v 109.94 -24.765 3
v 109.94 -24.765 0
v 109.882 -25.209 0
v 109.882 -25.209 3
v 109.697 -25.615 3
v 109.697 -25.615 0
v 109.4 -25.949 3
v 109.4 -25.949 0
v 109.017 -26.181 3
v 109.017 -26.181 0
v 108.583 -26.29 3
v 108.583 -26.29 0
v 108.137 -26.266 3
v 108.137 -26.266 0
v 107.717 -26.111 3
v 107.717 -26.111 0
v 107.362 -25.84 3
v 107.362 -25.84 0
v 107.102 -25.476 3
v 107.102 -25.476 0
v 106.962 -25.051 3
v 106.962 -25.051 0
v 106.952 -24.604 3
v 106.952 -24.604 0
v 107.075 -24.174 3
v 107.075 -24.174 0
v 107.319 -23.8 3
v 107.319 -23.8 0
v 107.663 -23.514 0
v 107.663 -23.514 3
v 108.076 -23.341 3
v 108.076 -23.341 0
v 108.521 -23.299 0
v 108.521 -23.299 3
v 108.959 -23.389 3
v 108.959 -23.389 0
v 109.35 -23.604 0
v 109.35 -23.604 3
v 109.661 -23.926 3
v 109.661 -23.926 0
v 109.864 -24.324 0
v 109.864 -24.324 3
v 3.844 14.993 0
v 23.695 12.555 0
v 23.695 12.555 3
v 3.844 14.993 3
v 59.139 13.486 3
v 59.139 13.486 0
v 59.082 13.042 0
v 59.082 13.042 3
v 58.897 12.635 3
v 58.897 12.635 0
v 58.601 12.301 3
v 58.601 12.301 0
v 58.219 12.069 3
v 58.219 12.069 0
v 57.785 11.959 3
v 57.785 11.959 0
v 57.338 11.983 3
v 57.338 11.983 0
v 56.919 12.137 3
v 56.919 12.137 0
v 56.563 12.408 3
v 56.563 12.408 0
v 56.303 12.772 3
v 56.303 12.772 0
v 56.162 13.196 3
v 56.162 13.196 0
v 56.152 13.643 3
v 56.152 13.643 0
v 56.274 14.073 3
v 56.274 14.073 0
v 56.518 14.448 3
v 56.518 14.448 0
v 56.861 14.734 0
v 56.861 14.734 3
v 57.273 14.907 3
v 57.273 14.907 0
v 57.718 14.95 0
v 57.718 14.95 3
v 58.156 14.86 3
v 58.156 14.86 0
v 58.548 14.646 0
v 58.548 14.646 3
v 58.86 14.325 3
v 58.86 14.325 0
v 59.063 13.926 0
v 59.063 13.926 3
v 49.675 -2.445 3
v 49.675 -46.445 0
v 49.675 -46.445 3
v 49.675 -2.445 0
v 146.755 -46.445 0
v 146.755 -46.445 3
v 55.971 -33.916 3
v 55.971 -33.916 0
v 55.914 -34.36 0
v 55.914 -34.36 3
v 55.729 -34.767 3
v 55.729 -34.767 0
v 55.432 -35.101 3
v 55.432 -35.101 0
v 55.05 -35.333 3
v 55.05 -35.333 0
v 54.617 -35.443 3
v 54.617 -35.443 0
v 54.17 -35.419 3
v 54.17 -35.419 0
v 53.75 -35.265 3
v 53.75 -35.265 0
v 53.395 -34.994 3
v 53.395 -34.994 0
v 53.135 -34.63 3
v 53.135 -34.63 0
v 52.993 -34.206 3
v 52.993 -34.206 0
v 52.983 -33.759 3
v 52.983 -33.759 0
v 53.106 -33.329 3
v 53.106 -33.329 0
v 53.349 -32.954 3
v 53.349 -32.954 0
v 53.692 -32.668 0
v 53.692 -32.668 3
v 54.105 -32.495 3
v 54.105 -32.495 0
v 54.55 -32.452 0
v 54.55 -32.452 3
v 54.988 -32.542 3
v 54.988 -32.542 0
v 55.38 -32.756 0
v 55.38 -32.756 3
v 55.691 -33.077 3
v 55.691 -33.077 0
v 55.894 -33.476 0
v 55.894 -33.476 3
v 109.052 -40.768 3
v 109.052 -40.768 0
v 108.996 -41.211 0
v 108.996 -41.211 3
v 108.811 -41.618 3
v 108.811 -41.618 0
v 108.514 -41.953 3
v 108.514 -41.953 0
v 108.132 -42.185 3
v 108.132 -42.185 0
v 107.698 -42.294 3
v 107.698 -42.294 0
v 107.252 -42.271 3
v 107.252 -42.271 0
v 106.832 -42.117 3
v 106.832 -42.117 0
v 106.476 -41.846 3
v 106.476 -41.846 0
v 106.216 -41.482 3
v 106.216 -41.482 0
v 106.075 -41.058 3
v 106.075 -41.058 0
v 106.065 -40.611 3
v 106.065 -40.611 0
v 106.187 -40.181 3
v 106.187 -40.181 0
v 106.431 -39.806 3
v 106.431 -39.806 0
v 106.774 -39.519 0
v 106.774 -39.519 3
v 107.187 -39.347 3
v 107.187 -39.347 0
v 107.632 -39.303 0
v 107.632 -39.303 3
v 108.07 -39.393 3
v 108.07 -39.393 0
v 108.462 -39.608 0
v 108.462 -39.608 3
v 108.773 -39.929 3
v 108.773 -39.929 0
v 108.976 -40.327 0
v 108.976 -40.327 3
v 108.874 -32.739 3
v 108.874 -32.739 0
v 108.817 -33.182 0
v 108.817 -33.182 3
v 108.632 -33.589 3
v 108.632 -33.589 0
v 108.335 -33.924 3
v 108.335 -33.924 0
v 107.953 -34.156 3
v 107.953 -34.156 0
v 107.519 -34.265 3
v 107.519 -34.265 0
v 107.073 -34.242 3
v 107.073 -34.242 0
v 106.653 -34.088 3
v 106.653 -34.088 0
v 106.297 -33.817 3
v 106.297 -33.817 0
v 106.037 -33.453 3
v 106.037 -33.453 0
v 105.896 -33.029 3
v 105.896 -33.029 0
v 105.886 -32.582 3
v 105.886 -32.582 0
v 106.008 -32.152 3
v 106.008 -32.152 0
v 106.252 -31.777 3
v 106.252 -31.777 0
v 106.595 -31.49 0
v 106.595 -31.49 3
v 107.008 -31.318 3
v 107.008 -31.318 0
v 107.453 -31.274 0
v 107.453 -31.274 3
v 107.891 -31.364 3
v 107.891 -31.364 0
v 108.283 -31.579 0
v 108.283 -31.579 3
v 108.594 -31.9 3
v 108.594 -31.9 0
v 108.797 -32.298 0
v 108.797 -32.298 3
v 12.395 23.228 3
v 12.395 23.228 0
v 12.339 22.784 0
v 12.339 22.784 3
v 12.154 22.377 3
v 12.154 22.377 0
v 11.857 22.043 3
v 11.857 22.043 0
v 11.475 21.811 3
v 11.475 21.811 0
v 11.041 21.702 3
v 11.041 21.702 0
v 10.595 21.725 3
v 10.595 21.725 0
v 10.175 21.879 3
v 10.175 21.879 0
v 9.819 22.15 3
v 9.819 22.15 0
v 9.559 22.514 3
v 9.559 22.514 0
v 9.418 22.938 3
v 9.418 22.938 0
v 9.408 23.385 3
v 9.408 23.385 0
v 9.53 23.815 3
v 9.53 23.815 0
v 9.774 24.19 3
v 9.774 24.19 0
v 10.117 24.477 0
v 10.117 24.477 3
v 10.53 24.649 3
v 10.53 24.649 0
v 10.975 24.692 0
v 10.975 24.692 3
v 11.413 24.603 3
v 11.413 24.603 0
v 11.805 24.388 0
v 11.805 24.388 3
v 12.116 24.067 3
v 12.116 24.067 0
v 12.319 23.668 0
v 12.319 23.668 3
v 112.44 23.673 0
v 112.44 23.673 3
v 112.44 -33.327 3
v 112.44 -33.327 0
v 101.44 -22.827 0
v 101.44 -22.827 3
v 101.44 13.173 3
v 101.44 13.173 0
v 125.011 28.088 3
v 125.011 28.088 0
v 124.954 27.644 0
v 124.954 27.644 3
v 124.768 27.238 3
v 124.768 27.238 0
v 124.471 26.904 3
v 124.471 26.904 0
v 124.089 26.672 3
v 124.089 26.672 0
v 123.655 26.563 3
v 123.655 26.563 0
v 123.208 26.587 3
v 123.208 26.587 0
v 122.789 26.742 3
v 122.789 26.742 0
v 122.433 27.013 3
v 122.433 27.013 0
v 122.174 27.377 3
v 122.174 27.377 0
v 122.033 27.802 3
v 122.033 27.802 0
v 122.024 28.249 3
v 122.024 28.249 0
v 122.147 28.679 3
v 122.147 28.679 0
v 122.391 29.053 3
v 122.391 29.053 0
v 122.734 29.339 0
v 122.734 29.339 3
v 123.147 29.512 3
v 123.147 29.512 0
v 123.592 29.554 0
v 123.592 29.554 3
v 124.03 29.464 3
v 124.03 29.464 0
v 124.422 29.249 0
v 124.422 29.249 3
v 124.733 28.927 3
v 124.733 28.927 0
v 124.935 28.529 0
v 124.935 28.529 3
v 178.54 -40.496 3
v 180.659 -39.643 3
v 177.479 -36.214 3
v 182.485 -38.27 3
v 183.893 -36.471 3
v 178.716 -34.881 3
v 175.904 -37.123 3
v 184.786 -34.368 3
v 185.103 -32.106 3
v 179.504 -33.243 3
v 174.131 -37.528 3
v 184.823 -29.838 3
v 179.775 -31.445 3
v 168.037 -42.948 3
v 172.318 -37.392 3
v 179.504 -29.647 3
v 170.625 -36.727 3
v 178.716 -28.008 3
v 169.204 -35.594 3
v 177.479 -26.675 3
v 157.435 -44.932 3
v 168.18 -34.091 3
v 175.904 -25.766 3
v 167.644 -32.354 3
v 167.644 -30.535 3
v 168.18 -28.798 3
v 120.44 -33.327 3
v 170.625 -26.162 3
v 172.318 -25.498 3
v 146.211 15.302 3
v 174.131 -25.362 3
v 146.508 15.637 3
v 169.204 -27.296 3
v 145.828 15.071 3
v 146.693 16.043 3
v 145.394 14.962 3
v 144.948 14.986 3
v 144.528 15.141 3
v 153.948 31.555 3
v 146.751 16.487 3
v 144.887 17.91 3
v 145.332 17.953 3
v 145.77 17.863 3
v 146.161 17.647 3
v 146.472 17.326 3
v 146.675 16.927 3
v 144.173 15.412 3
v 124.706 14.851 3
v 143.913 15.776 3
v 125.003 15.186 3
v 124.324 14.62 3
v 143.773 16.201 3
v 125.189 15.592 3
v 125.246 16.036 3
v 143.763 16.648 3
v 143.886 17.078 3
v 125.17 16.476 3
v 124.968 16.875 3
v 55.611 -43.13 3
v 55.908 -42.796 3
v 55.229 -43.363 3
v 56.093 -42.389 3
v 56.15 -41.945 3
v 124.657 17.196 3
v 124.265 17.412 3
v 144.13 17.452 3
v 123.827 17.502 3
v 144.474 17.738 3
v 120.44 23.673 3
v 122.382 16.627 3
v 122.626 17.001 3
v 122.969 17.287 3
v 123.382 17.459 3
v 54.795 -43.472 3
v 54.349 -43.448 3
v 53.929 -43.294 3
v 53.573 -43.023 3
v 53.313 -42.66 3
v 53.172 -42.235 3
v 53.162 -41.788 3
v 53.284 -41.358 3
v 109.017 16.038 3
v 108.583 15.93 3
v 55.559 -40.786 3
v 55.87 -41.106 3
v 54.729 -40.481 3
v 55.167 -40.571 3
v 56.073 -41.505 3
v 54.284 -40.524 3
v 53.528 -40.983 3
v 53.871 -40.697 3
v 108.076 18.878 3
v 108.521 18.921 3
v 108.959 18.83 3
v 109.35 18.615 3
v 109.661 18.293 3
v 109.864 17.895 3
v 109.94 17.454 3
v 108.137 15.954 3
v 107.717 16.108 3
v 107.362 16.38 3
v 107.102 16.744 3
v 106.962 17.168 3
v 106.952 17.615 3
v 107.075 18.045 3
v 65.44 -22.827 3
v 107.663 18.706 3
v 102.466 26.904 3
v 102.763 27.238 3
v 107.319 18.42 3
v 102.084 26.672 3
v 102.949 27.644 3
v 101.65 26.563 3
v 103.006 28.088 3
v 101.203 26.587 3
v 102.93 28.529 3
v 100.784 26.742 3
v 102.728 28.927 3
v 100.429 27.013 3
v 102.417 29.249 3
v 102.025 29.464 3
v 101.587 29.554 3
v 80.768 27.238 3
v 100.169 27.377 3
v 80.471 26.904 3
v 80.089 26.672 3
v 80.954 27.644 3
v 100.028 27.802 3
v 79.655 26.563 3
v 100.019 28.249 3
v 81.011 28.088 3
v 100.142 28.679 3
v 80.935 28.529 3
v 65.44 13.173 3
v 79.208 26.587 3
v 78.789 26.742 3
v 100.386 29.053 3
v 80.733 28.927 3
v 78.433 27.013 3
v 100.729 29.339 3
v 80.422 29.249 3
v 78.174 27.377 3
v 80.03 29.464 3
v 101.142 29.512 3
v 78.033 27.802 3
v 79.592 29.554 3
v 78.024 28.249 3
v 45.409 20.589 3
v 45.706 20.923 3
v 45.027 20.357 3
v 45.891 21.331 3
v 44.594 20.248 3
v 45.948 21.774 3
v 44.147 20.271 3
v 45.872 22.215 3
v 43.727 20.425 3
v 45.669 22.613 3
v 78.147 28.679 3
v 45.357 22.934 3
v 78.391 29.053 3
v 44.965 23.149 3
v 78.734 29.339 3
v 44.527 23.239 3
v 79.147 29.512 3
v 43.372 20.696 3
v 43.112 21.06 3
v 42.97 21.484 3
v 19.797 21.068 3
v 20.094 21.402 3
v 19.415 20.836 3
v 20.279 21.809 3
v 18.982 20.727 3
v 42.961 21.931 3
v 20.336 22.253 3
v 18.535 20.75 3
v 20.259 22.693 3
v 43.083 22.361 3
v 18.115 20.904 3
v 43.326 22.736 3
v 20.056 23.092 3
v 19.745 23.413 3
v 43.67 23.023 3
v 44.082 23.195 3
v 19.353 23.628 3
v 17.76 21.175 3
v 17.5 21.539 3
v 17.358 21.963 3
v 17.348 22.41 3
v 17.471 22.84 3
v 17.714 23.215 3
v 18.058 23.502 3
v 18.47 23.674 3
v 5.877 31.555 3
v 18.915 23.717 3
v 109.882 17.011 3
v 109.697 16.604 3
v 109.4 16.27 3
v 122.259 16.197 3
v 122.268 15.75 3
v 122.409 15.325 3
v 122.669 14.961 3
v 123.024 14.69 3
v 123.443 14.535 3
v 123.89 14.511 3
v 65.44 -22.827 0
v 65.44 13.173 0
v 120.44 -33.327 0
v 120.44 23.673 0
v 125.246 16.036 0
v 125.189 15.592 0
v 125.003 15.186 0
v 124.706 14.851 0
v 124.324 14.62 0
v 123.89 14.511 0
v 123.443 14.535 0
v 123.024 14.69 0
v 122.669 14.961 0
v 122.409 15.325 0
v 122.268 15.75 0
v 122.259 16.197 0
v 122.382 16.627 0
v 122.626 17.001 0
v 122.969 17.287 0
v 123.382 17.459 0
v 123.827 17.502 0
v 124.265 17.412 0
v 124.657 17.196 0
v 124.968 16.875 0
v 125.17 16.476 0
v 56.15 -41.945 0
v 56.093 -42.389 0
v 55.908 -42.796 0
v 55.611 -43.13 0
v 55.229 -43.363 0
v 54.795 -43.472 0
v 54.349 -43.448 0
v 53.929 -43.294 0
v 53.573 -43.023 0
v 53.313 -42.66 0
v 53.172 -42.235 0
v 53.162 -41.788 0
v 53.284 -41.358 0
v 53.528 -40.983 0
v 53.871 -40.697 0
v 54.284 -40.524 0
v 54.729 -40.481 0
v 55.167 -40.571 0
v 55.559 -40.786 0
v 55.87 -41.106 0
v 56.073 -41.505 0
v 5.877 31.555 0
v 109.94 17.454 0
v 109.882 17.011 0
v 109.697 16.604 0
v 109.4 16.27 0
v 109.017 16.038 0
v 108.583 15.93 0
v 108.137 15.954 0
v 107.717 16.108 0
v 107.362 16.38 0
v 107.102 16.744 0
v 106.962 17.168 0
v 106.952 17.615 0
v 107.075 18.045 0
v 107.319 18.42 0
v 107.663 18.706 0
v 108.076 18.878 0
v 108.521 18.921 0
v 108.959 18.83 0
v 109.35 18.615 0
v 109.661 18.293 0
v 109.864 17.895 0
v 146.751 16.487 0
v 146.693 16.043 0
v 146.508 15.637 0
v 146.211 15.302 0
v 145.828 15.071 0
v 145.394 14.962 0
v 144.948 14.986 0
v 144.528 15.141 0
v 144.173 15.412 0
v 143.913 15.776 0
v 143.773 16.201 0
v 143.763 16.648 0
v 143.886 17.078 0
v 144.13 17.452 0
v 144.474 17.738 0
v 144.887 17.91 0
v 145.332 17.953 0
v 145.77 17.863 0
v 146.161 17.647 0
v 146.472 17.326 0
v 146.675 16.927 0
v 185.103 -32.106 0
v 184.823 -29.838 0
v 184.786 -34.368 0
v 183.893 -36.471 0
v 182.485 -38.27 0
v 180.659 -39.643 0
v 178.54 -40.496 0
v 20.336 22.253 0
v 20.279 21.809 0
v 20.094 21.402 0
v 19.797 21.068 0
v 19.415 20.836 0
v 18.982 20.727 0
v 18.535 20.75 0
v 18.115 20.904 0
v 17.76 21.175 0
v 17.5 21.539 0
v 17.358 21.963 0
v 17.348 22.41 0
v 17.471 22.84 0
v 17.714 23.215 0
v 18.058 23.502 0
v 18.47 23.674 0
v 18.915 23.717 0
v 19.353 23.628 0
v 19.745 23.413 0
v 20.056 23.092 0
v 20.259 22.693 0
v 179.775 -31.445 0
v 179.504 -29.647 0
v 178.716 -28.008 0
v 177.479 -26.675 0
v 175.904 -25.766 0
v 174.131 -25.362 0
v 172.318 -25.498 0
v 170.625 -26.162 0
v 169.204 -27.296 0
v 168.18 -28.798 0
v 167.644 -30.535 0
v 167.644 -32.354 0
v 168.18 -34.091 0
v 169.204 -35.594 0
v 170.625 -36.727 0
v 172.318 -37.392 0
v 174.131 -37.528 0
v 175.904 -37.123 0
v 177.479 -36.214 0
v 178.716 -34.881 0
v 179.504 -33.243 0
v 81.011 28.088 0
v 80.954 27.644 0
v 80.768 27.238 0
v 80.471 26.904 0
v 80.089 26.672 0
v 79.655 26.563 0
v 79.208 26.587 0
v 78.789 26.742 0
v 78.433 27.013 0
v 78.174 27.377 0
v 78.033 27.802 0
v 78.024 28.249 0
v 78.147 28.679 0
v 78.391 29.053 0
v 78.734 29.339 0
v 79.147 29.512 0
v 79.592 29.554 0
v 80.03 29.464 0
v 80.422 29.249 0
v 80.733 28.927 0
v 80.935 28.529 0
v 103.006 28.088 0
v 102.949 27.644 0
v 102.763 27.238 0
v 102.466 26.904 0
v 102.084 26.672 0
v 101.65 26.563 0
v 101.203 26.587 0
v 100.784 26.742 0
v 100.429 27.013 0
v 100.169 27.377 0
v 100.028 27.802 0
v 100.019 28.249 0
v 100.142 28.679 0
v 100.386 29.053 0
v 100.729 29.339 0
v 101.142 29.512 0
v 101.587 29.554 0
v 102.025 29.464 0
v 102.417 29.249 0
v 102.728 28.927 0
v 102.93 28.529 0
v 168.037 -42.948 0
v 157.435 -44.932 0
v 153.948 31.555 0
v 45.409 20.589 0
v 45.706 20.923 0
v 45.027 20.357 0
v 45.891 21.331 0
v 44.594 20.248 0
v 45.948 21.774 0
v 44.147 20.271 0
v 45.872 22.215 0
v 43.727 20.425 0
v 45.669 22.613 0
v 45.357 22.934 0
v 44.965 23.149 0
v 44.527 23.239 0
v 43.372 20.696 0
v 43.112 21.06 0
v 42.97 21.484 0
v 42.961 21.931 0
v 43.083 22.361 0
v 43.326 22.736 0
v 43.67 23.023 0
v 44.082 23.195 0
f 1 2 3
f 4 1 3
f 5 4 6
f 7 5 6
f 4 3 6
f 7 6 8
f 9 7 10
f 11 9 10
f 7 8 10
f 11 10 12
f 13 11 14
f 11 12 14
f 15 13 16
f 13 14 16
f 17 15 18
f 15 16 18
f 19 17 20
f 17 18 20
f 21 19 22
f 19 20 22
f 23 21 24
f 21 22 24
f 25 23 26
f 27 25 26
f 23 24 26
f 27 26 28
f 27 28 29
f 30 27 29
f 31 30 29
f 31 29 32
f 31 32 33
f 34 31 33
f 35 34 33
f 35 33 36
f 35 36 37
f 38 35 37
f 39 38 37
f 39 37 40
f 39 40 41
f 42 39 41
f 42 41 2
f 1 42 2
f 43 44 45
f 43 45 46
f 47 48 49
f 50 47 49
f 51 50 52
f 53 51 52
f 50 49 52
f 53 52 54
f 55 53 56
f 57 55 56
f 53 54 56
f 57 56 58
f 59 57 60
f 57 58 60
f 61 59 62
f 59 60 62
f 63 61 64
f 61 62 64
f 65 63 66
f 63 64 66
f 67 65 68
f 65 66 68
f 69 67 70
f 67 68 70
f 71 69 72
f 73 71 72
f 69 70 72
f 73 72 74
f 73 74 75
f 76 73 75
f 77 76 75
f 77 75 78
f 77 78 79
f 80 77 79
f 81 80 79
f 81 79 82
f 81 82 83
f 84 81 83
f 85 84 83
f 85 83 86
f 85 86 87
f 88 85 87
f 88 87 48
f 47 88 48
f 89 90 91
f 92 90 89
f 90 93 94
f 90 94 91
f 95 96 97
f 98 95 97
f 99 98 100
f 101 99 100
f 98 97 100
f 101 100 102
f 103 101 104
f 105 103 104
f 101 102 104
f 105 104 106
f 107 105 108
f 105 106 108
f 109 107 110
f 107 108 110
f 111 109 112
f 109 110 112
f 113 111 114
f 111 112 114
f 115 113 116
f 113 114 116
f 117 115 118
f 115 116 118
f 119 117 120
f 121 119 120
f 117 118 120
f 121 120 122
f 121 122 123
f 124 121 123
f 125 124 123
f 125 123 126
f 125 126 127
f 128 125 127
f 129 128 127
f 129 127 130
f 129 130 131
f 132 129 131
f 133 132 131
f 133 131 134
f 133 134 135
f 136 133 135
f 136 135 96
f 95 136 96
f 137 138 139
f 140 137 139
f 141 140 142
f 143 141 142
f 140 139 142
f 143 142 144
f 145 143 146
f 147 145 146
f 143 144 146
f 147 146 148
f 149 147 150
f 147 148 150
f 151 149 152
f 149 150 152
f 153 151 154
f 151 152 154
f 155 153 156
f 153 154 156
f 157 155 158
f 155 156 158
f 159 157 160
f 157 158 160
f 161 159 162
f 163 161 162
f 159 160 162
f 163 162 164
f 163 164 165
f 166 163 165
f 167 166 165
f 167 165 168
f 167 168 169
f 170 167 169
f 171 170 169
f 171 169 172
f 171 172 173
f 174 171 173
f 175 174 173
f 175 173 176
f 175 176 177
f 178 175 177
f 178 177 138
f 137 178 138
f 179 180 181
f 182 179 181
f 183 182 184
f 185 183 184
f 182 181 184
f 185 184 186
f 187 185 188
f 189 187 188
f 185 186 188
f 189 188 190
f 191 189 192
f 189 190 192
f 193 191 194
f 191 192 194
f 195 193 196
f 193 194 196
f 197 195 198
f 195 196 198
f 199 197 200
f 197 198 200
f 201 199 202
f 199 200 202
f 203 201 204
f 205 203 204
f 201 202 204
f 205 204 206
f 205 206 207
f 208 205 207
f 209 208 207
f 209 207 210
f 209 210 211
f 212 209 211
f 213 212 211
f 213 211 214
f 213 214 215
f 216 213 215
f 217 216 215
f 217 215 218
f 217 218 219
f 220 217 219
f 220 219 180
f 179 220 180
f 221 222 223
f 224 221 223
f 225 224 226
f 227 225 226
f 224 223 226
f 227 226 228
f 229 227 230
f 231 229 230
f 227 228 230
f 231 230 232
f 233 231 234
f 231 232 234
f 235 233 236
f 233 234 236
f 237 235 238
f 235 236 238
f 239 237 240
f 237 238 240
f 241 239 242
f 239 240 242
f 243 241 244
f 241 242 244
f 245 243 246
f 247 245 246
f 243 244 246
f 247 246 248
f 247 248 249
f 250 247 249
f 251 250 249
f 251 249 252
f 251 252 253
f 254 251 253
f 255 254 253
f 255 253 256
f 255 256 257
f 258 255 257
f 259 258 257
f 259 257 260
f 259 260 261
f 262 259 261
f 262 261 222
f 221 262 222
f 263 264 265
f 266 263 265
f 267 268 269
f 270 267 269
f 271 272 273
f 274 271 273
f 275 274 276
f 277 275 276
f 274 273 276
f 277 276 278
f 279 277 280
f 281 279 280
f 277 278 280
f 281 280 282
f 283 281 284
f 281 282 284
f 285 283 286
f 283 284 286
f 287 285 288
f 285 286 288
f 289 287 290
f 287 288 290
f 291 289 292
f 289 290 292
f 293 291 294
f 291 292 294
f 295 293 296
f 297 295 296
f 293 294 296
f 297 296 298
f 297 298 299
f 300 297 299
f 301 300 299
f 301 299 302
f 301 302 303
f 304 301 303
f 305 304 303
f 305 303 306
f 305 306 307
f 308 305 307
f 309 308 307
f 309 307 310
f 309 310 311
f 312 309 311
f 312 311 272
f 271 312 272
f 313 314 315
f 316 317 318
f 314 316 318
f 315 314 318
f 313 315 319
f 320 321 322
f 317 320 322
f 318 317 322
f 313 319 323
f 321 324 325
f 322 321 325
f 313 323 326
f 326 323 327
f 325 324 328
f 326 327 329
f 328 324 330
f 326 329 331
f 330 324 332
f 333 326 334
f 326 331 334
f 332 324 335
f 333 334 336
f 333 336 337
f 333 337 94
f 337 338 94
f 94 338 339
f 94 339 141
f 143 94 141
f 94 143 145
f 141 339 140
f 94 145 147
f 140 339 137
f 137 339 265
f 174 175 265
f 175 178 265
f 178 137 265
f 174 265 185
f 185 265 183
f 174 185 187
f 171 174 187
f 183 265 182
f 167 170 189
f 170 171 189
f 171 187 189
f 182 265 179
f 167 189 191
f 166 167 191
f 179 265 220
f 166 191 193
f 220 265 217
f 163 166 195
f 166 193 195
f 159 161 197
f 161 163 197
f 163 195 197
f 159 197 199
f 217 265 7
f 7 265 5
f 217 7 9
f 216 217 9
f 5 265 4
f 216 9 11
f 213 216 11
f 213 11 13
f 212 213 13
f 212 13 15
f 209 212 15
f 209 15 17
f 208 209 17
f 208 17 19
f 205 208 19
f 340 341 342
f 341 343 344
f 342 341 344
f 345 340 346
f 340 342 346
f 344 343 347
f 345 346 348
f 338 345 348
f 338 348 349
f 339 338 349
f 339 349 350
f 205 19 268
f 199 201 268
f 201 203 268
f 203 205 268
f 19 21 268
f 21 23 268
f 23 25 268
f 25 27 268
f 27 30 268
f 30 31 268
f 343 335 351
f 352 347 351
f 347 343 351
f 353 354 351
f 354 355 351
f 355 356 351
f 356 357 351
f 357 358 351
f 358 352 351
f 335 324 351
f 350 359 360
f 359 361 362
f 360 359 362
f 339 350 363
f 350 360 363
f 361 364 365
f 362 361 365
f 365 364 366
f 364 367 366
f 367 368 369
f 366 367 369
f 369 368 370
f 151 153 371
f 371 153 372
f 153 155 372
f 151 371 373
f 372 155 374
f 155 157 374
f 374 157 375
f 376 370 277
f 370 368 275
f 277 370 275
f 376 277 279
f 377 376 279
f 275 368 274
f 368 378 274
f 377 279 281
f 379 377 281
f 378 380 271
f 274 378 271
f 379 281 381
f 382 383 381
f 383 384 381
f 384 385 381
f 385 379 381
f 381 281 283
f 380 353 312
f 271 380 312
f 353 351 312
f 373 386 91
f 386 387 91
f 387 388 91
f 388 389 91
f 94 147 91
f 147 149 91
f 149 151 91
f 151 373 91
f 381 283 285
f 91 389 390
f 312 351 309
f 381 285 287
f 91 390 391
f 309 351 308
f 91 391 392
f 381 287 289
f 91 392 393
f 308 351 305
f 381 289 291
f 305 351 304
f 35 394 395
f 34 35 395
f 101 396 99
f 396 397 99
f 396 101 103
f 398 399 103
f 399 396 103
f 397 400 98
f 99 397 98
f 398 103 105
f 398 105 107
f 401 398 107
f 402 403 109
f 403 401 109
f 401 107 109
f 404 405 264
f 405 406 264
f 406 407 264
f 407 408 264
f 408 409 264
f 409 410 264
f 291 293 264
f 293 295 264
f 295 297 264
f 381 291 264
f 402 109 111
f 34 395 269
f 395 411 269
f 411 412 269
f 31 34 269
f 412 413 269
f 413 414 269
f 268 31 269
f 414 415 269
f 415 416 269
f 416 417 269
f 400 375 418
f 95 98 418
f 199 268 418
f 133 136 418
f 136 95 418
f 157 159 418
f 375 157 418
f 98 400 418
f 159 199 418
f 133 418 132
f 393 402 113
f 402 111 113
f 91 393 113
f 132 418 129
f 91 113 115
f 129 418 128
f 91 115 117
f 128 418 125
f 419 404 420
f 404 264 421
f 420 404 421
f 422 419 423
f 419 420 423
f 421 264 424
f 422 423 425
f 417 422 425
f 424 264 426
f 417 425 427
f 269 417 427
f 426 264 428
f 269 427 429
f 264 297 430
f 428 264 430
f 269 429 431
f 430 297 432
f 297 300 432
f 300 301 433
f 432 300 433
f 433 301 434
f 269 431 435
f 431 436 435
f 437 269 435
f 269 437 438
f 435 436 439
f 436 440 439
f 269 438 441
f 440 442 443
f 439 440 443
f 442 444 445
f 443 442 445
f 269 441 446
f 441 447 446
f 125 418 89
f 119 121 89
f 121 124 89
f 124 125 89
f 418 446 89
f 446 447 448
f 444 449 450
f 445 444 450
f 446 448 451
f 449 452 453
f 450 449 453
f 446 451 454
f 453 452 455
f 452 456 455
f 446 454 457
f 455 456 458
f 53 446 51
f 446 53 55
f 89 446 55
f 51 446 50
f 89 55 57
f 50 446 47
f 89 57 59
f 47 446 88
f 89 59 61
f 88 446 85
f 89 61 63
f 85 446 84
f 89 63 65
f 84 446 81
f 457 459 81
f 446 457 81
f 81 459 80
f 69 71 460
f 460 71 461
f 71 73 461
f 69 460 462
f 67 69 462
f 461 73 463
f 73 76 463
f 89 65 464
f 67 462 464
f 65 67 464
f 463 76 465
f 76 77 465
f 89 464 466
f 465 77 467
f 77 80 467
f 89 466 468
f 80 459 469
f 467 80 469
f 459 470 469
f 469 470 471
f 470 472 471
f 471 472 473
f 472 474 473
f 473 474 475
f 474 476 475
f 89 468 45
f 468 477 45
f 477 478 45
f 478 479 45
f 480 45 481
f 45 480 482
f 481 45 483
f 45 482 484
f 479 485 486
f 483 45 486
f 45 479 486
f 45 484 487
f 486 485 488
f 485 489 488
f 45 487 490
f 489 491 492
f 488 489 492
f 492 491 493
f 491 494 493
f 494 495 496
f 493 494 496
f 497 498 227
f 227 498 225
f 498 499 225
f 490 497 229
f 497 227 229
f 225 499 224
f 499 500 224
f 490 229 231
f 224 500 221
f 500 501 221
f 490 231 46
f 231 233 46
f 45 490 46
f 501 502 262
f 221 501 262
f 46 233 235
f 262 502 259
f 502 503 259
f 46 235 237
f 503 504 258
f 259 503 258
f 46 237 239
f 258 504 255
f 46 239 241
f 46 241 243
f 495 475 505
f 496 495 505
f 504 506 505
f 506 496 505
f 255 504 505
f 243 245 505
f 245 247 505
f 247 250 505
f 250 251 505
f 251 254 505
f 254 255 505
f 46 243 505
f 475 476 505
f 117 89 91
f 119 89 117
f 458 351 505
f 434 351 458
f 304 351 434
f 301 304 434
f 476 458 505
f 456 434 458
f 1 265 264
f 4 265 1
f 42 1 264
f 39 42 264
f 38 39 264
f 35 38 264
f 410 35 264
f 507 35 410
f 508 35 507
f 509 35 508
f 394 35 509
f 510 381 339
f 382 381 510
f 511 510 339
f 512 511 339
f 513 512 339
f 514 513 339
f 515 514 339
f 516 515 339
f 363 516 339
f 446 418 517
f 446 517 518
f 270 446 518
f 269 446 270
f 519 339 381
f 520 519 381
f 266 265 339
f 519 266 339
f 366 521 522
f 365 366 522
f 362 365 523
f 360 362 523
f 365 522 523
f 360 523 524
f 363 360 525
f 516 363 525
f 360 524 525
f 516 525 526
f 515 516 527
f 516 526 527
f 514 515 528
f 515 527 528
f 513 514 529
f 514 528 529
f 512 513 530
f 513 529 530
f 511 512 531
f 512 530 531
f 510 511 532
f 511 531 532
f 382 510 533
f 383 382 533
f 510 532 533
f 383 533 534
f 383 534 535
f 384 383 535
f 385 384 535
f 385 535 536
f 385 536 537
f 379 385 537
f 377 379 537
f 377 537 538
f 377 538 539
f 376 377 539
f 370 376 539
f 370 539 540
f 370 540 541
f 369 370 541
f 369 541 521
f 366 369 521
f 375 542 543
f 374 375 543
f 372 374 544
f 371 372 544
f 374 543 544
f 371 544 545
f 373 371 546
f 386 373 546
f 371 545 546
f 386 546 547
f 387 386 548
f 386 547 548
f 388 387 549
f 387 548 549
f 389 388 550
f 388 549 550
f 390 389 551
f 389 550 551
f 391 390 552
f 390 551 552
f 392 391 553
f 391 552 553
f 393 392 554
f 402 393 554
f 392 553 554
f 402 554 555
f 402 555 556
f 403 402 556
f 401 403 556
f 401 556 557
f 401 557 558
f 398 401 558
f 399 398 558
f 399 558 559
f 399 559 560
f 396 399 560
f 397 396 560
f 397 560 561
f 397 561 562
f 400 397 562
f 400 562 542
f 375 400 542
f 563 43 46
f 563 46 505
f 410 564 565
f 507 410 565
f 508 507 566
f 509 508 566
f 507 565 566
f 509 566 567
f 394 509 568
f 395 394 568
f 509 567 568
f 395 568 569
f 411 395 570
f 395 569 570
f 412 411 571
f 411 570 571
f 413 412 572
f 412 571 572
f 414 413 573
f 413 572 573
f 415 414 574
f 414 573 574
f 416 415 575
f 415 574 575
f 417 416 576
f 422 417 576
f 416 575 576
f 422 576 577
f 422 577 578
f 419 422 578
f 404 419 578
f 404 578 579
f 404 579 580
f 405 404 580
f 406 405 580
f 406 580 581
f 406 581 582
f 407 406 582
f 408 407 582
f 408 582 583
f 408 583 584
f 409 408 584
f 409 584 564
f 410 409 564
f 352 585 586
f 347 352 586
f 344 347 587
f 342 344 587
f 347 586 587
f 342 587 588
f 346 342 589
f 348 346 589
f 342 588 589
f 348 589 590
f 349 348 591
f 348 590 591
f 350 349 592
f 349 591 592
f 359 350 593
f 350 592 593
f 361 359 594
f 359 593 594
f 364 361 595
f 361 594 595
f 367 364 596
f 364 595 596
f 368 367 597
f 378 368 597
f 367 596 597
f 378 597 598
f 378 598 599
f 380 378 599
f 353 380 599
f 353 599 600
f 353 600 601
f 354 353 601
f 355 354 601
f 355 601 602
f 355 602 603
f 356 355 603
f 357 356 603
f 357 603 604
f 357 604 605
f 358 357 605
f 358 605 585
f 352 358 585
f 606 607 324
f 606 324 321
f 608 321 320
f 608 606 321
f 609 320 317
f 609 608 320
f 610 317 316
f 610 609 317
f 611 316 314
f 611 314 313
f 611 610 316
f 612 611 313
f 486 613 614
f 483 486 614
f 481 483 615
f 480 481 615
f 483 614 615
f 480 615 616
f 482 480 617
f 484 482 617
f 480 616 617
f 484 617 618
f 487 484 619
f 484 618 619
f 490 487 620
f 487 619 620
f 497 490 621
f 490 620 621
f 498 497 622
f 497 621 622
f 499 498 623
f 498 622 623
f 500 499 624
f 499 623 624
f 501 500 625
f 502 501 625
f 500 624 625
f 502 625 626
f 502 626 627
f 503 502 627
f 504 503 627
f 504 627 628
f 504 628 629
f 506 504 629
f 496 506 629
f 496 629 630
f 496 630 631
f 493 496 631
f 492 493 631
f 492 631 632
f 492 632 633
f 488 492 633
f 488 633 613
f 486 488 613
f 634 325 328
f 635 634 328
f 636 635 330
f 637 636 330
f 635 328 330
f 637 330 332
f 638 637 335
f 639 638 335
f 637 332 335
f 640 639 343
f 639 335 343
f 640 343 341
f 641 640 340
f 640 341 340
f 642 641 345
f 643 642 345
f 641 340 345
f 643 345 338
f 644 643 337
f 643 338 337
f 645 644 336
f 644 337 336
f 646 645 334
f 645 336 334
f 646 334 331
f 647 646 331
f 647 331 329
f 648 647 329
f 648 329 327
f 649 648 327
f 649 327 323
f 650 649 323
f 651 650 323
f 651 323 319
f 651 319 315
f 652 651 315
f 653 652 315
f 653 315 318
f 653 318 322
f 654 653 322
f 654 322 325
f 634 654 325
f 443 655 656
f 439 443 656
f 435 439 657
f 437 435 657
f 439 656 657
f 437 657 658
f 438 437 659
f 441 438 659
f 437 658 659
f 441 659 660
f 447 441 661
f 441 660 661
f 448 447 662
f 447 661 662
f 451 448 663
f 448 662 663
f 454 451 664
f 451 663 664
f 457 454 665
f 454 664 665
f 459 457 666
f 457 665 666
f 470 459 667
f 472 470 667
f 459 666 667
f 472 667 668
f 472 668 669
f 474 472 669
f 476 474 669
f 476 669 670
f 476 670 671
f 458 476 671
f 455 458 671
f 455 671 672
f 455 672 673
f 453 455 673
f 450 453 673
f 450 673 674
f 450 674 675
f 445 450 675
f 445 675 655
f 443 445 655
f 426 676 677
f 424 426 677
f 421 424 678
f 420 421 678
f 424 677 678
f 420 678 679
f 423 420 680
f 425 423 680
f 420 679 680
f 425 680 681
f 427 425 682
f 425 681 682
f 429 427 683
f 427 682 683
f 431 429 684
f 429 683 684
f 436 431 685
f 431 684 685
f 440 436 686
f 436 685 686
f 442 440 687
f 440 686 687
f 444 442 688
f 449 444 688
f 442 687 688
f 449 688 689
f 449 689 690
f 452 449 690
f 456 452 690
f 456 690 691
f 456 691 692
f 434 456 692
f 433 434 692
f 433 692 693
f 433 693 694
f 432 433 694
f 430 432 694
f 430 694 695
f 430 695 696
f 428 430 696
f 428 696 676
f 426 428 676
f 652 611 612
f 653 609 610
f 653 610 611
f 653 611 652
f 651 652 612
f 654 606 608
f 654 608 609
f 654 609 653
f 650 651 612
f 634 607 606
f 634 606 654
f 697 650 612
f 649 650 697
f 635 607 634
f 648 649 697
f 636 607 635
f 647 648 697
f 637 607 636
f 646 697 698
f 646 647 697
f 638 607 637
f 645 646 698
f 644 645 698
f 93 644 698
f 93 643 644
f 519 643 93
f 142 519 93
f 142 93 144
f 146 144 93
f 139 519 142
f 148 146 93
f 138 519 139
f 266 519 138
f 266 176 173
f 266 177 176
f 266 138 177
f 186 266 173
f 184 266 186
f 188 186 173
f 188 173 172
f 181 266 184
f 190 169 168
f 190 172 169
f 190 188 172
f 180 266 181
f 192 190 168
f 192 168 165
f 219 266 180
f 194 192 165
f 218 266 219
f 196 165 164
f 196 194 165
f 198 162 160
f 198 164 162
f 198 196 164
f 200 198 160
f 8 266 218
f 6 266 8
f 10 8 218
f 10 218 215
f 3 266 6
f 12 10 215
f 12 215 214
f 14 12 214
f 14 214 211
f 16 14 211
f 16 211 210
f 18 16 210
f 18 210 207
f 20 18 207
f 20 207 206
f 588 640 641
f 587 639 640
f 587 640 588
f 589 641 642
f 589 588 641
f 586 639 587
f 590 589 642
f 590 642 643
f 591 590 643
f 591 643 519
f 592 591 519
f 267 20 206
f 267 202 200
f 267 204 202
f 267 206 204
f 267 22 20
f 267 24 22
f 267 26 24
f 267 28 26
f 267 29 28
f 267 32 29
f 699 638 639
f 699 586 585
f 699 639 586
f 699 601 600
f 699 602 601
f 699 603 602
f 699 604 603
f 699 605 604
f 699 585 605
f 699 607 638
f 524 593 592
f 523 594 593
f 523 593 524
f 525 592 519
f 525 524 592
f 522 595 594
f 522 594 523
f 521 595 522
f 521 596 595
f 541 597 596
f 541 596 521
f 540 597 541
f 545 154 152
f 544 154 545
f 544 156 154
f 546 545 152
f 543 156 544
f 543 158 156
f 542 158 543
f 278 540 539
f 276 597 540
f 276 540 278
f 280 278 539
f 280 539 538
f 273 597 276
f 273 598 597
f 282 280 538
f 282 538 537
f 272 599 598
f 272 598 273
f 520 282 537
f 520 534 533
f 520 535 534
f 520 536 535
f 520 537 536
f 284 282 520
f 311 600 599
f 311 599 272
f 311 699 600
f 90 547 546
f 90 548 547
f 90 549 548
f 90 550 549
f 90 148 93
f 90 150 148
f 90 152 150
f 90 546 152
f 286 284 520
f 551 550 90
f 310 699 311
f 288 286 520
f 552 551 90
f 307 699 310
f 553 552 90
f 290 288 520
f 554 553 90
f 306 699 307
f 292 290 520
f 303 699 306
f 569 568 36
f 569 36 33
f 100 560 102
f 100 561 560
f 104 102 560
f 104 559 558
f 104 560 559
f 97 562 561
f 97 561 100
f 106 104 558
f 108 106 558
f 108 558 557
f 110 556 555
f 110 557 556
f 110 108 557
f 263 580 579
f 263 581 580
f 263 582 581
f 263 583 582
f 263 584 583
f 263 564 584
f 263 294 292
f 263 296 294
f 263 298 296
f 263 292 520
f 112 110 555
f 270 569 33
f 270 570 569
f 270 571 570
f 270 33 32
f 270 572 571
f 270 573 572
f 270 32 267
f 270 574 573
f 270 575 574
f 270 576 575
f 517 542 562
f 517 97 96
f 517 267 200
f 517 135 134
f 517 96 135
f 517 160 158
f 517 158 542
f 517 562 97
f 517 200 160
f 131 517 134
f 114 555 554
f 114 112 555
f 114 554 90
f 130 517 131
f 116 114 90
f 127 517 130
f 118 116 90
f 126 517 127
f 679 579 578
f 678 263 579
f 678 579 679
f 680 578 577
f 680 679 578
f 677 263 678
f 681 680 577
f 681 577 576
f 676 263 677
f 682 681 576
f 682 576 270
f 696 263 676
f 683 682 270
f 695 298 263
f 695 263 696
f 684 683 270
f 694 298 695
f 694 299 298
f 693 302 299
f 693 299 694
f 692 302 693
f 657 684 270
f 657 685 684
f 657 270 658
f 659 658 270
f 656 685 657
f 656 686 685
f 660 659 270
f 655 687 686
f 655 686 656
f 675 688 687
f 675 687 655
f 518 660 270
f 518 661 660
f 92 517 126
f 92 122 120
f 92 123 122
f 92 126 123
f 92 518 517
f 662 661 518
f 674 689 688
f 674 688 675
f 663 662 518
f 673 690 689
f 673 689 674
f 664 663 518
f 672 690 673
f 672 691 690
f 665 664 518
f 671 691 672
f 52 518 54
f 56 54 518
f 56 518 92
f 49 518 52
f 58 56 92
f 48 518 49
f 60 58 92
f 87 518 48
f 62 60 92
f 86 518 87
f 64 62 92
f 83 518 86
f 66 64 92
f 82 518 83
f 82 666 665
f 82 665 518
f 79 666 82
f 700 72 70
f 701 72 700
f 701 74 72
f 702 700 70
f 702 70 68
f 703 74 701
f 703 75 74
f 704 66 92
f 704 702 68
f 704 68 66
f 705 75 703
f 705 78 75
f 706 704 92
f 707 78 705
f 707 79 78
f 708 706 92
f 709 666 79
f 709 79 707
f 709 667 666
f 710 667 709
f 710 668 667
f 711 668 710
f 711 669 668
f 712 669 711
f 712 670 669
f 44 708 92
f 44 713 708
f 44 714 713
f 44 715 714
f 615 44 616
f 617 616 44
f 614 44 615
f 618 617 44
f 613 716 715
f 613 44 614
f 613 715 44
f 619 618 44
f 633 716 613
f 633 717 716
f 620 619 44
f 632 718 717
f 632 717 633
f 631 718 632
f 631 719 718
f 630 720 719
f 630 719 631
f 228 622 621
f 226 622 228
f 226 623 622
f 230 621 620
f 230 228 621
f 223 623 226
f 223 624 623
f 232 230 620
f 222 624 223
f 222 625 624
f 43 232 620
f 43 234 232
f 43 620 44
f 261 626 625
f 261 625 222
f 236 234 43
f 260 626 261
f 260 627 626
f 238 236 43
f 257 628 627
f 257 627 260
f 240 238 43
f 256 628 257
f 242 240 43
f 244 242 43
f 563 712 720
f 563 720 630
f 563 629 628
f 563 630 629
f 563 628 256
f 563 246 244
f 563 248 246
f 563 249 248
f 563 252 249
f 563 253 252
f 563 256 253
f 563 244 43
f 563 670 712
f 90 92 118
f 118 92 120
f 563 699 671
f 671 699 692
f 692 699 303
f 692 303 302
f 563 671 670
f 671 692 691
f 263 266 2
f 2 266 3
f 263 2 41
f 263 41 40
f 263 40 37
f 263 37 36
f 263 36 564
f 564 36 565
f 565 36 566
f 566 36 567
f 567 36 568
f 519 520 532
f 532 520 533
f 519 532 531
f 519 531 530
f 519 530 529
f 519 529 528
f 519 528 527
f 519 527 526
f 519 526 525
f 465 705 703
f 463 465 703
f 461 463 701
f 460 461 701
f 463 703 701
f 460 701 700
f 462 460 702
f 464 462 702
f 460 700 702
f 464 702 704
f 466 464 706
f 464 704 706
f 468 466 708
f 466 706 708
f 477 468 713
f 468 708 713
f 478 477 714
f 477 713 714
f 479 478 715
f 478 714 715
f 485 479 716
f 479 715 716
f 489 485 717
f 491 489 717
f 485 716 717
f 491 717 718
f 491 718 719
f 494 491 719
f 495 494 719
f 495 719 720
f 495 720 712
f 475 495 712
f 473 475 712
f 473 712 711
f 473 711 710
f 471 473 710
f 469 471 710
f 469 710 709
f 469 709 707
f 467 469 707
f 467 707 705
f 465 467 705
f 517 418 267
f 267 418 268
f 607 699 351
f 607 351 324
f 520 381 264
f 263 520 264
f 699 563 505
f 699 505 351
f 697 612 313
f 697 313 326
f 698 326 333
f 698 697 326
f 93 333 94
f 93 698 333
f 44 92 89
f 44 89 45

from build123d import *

# Parameters (mm, degrees)
EXTRUDE_1_DEPTH     = 3
CUT_EXTRUDE_1_REACH = 5
SKETCH_2_R          = 6.1
SKETCH_2_W          = 36
SKETCH_2_H          = 36
MM_CLEARANCE_1_D    = 3
MM_CLEARANCE_4_D    = 3
MM_PRESS_1_D        = 3
MM_PRESS_2_D        = 3
MM_PRESS_4_D        = 3


with BuildPart() as part:
    # 草图1 → 凸台-拉伸1 (new body)
    with BuildSketch(Plane.XY):
        with BuildLine():
            Line((30.58739299, 31.55542954), (153.948275504, 31.55542954))
            Line((153.948275504, 31.55542954), (184.822670137, -29.838251263))
            ThreePointArc((184.822670137, -29.838251263), (183.892664178, -36.470729041), (178.540104648, -40.496245038))
            ThreePointArc((178.540104648, -40.496245038), (162.746691749, -43.998966844), (146.755444956, -46.44457046))
            Line((146.755444956, -46.44457046), (49.675444956, -46.44457046))
            Line((49.675444956, -46.44457046), (49.675444956, -2.44457046))
            Line((49.675444956, -2.44457046), (23.694682842, 12.55542954))
            Line((23.694682842, 12.55542954), (3.843759809, 14.992816408))
            Line((3.843759809, 14.992816408), (5.87739299, 31.55542954))
            Line((5.87739299, 31.55542954), (30.58739299, 31.55542954))
        make_face()
    extrude(amount=EXTRUDE_1_DEPTH)

    # 草图2 → 切除-拉伸1 (cut, up to next)
    with BuildSketch(Plane.XY.offset(3), mode=Mode.PRIVATE) as cut_extrude_1_sk1:
        with Locations((173.675444956, -31.44457046)):
            Circle(SKETCH_2_R)
    cut_extrude_1_tool1 = extrude(cut_extrude_1_sk1.sketch, amount=-CUT_EXTRUDE_1_REACH, mode=Mode.PRIVATE) & part.part
    add(cut_extrude_1_tool1.solids().sort_by_distance((173.675445, -31.44457, 3))[0], mode=Mode.SUBTRACT)
    # 草图2 → 切除-拉伸1 (cut, up to next)
    with BuildSketch(Plane.XY.offset(3), mode=Mode.PRIVATE) as cut_extrude_1_sk2:
        with Locations((83.439887491, -4.827295438)):
            Rectangle(SKETCH_2_W, SKETCH_2_H)
    cut_extrude_1_tool2 = extrude(cut_extrude_1_sk2.sketch, amount=-CUT_EXTRUDE_1_REACH, mode=Mode.PRIVATE) & part.part
    add(cut_extrude_1_tool2.solids().sort_by_distance((83.439887, -4.827295, 3))[0], mode=Mode.SUBTRACT)
    # 草图2 → 切除-拉伸1 (cut, up to next)
    with BuildSketch(Plane.XY.offset(3), mode=Mode.PRIVATE) as cut_extrude_1_sk3:
        Polygon((112.439887491, -4.827295438), (112.439887491, -33.327295438), (120.439887491, -33.327295438), (120.439887491, 23.672704562), (112.439887491, 23.672704562), align=None)
    cut_extrude_1_tool3 = extrude(cut_extrude_1_sk3.sketch, amount=-CUT_EXTRUDE_1_REACH, mode=Mode.PRIVATE) & part.part
    add(cut_extrude_1_tool3.solids().sort_by_distance((116.439887, -4.827295, 3))[0], mode=Mode.SUBTRACT)

    # 大小mm Clearance 暗销孔1 (through all)
    with Locations(Plane(origin=(141.510624827, 151.85923203, 3), x_dir=(-0.999780146, -0.020968043, 0), z_dir=(0, 0, 1))):
        with Locations((20.591231353, 123.39816829), (42.591231353, 122.936763059), (64.581557509, 122.475560716)):
            Hole(MM_CLEARANCE_1_D / 2)

    # 大小mm Clearance 暗销孔4 (through all)
    with Locations(Plane(origin=(141.510624827, 151.85923203, 3), x_dir=(-0.999780146, -0.020968043, 0), z_dir=(0, 0, 1))):
        with Locations((20.608818994, 135.452556109), (-0.900285243, 135.452556109)):
            Hole(MM_CLEARANCE_4_D / 2)

    # 大小mm Press 暗销孔1 (through all)
    with Locations(Plane(origin=(141.673702765, 151.858231724, 3), x_dir=(-0.99978014, -0.020968354, 0), z_dir=(0, 0, 1))):
        with Locations((36.045400202, 133.709111751), (36.930668673, 175.919093371)):
            Hole(MM_PRESS_1_D / 2)

    # 大小mm Press 暗销孔2 (through all)
    with Locations(Plane(origin=(143.54728393, 150.625368255, 3), x_dir=(-0.99975237, -0.022253058, 0), z_dir=(0, 0, 1))):
        with Locations((88.938953066, 135.227377046), (101.942467158, 126.647536361), (127.53759353, 125.598807912), (135.454300746, 124.4473971)):
            Hole(MM_PRESS_2_D / 2)

    # 大小mm Press 暗销孔4 (through all)
    with Locations(Plane(origin=(143.54728393, 150.625368255, 3), x_dir=(-0.99975237, -0.022253058, 0), z_dir=(0, 0, 1))):
        with Locations((93.161367469, 190.578219389), (93.161367469, 182.547127137), (40.245392963, 190.578219389), (40.245392963, 182.547127137)):
            Hole(MM_PRESS_4_D / 2)


solid = part.part
